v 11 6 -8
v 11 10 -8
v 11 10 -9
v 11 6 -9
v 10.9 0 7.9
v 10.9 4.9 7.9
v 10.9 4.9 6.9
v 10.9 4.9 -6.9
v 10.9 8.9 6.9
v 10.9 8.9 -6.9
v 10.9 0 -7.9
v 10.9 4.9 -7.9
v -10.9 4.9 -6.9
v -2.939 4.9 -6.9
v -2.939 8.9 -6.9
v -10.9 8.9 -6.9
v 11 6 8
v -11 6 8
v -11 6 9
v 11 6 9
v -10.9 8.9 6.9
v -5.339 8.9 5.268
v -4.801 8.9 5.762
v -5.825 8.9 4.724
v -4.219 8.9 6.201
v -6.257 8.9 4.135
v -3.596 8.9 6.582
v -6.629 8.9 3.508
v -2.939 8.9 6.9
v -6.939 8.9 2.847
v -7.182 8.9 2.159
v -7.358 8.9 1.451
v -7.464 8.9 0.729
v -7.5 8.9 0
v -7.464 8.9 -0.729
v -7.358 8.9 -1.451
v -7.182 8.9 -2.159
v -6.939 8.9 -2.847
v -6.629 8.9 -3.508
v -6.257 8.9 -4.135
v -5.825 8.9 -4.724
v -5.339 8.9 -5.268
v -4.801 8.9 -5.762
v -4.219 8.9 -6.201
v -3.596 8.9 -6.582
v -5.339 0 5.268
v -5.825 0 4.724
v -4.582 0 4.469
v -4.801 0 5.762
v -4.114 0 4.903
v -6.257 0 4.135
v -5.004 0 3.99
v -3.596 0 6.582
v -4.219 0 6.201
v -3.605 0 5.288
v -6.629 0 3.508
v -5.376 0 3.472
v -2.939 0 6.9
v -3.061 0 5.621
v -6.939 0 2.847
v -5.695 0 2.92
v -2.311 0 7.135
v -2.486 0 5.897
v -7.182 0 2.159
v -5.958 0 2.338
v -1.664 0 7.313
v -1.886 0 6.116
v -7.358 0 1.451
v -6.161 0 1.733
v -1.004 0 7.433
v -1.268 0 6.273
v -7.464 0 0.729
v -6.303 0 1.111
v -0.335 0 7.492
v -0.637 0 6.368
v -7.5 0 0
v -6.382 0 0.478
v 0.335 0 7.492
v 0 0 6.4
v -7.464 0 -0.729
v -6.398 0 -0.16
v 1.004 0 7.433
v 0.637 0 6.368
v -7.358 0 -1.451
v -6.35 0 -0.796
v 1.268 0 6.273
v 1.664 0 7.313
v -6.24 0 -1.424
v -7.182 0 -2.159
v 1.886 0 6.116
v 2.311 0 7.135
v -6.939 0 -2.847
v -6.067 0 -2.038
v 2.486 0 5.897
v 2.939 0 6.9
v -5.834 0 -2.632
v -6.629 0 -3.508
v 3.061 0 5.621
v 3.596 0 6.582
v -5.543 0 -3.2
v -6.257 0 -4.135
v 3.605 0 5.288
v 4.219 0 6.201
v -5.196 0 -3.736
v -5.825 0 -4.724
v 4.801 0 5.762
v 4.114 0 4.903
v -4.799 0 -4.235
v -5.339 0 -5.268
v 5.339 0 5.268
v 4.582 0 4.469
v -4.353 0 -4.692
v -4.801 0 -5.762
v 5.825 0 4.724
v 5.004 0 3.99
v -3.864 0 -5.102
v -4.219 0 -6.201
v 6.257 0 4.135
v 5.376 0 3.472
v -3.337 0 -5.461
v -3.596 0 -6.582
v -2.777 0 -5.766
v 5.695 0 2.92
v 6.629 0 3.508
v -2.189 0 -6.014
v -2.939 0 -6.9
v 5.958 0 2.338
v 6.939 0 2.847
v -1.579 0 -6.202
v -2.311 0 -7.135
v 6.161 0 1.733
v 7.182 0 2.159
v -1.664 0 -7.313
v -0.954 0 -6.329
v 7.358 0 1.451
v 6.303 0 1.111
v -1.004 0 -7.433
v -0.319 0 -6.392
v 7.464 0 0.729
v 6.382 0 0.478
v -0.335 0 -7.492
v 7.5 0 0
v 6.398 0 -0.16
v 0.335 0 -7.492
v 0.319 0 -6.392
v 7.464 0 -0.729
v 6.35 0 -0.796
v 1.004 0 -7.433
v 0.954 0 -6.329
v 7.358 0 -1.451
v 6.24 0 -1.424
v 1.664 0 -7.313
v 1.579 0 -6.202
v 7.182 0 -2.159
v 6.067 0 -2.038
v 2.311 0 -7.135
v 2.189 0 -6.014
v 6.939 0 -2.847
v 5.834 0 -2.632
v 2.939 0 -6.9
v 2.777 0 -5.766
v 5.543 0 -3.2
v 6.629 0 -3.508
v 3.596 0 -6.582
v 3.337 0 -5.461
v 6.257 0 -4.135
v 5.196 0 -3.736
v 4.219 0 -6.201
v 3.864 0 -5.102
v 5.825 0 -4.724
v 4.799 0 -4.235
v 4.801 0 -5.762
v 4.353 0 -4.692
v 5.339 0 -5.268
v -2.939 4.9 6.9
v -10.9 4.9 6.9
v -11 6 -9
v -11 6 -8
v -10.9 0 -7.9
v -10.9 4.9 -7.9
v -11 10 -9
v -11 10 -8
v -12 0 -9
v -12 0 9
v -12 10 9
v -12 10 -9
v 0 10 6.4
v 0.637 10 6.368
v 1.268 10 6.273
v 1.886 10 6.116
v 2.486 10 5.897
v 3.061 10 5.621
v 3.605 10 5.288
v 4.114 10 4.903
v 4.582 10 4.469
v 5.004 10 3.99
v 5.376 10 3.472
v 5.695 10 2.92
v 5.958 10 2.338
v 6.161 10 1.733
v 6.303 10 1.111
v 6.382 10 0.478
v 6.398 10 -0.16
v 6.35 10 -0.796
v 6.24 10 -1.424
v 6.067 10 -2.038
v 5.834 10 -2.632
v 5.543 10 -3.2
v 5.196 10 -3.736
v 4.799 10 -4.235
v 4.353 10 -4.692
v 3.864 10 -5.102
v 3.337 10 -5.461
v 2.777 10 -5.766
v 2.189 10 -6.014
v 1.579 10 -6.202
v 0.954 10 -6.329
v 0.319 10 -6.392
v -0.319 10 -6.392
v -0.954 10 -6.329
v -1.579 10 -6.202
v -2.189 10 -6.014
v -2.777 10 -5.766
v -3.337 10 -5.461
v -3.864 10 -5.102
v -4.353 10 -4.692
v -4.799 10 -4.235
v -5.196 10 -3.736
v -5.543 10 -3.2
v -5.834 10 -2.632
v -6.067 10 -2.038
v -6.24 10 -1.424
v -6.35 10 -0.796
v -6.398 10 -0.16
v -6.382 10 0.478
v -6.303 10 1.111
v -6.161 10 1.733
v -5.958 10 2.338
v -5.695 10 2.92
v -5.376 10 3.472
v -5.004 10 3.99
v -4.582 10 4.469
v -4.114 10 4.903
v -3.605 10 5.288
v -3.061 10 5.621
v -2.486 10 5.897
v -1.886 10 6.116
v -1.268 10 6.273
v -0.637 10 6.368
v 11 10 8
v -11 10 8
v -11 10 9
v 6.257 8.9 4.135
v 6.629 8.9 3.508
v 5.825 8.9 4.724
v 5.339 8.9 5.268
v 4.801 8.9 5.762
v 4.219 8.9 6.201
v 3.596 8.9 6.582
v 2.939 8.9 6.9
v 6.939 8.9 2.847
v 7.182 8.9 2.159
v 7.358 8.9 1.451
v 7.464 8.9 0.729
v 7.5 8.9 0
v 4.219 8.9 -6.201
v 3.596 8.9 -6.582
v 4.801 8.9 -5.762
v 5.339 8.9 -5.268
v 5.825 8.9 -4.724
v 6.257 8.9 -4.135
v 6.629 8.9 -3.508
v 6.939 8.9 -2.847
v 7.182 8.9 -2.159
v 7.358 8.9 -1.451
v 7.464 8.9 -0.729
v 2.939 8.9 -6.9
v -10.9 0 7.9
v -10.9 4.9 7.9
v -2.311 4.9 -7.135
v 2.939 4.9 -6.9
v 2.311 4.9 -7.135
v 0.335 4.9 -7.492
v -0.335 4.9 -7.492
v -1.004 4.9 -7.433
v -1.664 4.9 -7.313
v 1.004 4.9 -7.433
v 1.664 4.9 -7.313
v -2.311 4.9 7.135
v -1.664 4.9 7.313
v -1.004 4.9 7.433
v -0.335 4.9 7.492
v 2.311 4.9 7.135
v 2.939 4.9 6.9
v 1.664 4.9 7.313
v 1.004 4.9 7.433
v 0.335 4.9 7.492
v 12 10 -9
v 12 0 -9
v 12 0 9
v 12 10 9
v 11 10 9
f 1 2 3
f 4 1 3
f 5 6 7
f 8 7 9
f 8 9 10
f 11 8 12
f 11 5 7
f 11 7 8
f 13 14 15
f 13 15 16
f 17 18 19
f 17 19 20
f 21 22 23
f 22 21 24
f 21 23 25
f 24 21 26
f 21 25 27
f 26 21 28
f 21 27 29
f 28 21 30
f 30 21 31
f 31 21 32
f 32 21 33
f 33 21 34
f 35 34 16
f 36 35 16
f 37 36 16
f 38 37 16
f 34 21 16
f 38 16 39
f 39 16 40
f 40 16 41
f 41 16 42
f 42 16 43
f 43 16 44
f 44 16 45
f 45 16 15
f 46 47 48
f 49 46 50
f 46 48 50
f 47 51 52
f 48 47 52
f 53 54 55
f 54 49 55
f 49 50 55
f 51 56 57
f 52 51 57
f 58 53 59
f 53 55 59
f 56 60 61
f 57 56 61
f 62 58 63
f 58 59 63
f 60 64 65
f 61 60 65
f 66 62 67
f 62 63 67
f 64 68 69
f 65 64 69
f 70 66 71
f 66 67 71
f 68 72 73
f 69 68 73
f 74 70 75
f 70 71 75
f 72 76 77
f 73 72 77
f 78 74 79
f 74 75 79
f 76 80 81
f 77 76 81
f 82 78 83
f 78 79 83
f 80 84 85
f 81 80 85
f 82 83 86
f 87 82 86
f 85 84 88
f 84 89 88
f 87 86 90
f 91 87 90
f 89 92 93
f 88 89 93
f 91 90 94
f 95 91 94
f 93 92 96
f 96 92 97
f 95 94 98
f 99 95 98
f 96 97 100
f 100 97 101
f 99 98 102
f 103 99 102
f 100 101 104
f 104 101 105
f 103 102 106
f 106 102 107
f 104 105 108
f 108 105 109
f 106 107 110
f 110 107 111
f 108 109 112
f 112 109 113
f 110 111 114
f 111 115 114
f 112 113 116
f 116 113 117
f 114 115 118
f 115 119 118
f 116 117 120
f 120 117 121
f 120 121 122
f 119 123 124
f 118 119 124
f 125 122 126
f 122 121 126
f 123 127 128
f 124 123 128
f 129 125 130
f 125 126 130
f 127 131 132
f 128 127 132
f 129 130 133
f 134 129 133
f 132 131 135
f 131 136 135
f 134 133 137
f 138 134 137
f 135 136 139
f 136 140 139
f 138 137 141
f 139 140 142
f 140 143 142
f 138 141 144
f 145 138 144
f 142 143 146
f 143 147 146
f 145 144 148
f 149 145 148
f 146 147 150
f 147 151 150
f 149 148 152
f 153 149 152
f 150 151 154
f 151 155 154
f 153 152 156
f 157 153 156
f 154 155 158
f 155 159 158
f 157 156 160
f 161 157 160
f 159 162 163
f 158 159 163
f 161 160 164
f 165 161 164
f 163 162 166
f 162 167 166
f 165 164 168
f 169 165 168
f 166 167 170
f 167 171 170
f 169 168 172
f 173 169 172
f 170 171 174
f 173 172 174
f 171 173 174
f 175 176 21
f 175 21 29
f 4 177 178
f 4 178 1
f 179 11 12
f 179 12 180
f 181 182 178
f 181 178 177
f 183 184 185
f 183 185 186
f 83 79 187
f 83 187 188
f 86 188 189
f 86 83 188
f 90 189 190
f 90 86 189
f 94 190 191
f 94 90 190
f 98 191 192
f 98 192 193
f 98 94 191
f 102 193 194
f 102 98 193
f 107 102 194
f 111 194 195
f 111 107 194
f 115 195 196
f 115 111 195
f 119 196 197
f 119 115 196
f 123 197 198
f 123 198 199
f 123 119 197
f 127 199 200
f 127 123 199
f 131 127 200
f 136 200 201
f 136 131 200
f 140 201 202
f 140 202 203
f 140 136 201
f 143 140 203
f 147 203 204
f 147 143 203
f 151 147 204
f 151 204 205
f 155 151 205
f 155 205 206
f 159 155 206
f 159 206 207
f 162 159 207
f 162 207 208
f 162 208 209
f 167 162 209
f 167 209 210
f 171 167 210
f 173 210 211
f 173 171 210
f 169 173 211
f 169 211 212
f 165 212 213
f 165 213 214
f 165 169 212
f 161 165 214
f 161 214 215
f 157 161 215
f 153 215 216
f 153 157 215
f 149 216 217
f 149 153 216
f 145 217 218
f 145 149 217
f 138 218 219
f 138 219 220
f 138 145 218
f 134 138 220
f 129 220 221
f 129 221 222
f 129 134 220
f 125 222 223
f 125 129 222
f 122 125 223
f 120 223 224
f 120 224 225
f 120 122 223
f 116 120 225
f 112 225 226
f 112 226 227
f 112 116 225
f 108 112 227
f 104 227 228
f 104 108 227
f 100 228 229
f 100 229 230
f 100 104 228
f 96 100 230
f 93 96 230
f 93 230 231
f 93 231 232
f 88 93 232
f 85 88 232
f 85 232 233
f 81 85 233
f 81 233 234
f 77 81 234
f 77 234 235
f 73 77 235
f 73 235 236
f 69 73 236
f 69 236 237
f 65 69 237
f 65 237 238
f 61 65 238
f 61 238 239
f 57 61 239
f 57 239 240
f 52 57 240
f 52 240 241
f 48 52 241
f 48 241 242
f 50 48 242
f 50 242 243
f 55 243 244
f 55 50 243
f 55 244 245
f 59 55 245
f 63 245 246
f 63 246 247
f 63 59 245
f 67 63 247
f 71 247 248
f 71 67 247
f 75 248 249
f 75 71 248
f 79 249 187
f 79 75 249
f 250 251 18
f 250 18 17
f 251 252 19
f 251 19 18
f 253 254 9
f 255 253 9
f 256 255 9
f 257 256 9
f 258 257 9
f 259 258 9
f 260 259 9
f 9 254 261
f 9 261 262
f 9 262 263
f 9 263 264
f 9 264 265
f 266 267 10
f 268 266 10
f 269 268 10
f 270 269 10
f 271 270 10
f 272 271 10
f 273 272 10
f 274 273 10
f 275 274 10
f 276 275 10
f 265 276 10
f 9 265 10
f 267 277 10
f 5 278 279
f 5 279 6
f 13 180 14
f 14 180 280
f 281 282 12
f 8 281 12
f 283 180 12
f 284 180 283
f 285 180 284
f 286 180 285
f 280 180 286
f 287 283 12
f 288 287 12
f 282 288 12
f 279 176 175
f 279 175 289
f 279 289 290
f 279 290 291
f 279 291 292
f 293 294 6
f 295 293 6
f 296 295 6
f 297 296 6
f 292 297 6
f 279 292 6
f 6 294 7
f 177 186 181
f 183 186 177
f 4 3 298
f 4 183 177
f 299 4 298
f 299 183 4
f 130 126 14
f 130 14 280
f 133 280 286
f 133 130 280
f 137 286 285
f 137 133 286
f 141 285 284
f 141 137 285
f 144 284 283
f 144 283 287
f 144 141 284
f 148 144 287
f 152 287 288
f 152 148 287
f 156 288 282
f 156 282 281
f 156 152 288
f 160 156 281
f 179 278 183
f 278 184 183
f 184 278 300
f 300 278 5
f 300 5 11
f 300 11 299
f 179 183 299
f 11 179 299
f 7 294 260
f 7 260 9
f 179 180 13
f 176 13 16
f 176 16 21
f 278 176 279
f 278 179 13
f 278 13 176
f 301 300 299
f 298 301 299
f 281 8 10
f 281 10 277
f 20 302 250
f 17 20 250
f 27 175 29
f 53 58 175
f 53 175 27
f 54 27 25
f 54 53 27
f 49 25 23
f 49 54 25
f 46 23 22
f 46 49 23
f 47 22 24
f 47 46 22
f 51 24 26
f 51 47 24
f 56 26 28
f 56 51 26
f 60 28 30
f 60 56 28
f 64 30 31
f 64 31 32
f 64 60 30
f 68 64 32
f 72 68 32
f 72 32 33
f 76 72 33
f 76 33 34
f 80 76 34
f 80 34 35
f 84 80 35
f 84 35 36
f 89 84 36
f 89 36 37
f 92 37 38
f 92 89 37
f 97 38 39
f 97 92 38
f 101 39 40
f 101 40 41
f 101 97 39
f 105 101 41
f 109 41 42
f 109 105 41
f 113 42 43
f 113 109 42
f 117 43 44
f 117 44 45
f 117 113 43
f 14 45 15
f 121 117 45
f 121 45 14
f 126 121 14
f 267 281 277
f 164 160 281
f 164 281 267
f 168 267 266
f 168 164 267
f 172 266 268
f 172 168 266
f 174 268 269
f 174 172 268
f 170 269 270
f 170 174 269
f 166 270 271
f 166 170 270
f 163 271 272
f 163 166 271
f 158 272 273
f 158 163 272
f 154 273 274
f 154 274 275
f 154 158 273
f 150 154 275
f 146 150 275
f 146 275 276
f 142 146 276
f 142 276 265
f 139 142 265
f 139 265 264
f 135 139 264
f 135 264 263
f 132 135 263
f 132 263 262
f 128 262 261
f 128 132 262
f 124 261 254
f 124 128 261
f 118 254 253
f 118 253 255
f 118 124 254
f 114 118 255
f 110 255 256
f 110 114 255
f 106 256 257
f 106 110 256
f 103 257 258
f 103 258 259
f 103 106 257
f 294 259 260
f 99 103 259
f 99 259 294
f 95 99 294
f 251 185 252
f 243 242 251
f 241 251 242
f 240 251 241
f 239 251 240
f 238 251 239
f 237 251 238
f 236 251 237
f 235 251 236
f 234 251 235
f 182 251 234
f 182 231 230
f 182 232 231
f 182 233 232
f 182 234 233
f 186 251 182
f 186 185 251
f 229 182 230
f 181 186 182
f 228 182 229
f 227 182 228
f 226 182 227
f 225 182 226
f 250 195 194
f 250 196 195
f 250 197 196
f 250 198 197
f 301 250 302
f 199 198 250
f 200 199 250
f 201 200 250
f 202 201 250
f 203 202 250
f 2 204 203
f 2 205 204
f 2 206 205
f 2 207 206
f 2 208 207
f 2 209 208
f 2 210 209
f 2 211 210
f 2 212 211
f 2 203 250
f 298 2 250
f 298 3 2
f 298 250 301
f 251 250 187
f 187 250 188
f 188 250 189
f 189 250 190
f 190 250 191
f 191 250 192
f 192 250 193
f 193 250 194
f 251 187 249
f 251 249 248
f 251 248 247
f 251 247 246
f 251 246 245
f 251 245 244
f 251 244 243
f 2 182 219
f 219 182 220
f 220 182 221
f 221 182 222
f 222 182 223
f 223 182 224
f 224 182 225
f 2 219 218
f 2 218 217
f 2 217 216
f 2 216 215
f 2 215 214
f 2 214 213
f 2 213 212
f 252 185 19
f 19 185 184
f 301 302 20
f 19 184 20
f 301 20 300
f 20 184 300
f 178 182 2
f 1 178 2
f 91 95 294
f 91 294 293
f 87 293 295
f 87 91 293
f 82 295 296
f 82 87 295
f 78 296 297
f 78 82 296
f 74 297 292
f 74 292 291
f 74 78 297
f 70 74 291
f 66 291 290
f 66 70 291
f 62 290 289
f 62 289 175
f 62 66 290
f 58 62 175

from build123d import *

# Parameters (mm, degrees)
SKETCH1_W           = 24
SKETCH1_H           = 18
SKETCH1_R           = 6.4
BOSS_EXTRUDE1_DEPTH = 10
SKETCH2_W           = 22
SKETCH2_H           = 1
CUT_EXTRUDE1_DEPTH  = 4
SHELL1_DEPTH        = 8.9
SHELL1_2_DEPTH      = 4.9


# Read off the part's stored shape, not the designer's step: Shell1
with BuildPart() as part:
    # Sketch1 → Boss-Extrude1 (new body)
    with BuildSketch(Plane(origin=(0, 0, 0), x_dir=(1, 0, 0), z_dir=(0, 1, 0))):
        Rectangle(SKETCH1_W, SKETCH1_H)
        with Locations(Location((0, 0, 0), (0, 0, 270))):
            Circle(SKETCH1_R, mode=Mode.SUBTRACT)
    extrude(amount=BOSS_EXTRUDE1_DEPTH)

    # Sketch2 → Cut-Extrude1 (cut)
    with BuildSketch(Plane(origin=(0, 10, 0), x_dir=(1, 0, 0), z_dir=(0, 1, 0))):
        with Locations((0, 8.5)):
            Rectangle(SKETCH2_W, SKETCH2_H)
        with Locations((0, -8.5)):
            Rectangle(SKETCH2_W, SKETCH2_H)
    extrude(amount=-CUT_EXTRUDE1_DEPTH, mode=Mode.SUBTRACT)

    # Shell1 outline → Shell1 (cut)
    with BuildSketch(Plane(origin=(0, 0, 0), x_dir=(1, 0, 0), z_dir=(0, 1, 0))):
        with BuildLine():
            ThreePointArc((2.939387691, 6.9), (7.5, 0), (2.939387691, -6.9))
            Line((2.939387691, -6.9), (10.9, -6.9))
            Line((10.9, -6.9), (10.9, 6.9))
            Line((10.9, 6.9), (2.939387691, 6.9))
        make_face()
        with BuildLine():
            ThreePointArc((-2.939387691, -6.9), (-7.5, 0), (-2.939387691, 6.9))
            Line((-2.939387691, 6.9), (-10.9, 6.9))
            Line((-10.9, 6.9), (-10.9, -6.9))
            Line((-10.9, -6.9), (-2.939387691, -6.9))
        make_face()
    extrude(amount=SHELL1_DEPTH, mode=Mode.SUBTRACT)

    # Shell1 2 outline → Shell1 2 (cut)
    with BuildSketch(Plane(origin=(0, 0, 0), x_dir=(1, 0, 0), z_dir=(0, 1, 0))):
        with BuildLine():
            ThreePointArc((-2.939387691, 6.9), (0, 7.5), (2.939387691, 6.9))
            Line((2.939387691, 6.9), (10.9, 6.9))
            Line((10.9, 6.9), (10.9, 7.9))
            Line((10.9, 7.9), (-10.9, 7.9))
            Line((-10.9, 7.9), (-10.9, 6.9))
            Line((-10.9, 6.9), (-2.939387691, 6.9))
        make_face()
        with BuildLine():
            Line((10.9, -6.9), (2.939387691, -6.9))
            ThreePointArc((2.939387691, -6.9), (0, -7.5), (-2.939387691, -6.9))
            Line((-2.939387691, -6.9), (-10.9, -6.9))
            Line((-10.9, -6.9), (-10.9, -7.9))
            Line((-10.9, -7.9), (10.9, -7.9))
            Line((10.9, -7.9), (10.9, -6.9))
        make_face()
    extrude(amount=SHELL1_2_DEPTH, mode=Mode.SUBTRACT)


solid = part.part
